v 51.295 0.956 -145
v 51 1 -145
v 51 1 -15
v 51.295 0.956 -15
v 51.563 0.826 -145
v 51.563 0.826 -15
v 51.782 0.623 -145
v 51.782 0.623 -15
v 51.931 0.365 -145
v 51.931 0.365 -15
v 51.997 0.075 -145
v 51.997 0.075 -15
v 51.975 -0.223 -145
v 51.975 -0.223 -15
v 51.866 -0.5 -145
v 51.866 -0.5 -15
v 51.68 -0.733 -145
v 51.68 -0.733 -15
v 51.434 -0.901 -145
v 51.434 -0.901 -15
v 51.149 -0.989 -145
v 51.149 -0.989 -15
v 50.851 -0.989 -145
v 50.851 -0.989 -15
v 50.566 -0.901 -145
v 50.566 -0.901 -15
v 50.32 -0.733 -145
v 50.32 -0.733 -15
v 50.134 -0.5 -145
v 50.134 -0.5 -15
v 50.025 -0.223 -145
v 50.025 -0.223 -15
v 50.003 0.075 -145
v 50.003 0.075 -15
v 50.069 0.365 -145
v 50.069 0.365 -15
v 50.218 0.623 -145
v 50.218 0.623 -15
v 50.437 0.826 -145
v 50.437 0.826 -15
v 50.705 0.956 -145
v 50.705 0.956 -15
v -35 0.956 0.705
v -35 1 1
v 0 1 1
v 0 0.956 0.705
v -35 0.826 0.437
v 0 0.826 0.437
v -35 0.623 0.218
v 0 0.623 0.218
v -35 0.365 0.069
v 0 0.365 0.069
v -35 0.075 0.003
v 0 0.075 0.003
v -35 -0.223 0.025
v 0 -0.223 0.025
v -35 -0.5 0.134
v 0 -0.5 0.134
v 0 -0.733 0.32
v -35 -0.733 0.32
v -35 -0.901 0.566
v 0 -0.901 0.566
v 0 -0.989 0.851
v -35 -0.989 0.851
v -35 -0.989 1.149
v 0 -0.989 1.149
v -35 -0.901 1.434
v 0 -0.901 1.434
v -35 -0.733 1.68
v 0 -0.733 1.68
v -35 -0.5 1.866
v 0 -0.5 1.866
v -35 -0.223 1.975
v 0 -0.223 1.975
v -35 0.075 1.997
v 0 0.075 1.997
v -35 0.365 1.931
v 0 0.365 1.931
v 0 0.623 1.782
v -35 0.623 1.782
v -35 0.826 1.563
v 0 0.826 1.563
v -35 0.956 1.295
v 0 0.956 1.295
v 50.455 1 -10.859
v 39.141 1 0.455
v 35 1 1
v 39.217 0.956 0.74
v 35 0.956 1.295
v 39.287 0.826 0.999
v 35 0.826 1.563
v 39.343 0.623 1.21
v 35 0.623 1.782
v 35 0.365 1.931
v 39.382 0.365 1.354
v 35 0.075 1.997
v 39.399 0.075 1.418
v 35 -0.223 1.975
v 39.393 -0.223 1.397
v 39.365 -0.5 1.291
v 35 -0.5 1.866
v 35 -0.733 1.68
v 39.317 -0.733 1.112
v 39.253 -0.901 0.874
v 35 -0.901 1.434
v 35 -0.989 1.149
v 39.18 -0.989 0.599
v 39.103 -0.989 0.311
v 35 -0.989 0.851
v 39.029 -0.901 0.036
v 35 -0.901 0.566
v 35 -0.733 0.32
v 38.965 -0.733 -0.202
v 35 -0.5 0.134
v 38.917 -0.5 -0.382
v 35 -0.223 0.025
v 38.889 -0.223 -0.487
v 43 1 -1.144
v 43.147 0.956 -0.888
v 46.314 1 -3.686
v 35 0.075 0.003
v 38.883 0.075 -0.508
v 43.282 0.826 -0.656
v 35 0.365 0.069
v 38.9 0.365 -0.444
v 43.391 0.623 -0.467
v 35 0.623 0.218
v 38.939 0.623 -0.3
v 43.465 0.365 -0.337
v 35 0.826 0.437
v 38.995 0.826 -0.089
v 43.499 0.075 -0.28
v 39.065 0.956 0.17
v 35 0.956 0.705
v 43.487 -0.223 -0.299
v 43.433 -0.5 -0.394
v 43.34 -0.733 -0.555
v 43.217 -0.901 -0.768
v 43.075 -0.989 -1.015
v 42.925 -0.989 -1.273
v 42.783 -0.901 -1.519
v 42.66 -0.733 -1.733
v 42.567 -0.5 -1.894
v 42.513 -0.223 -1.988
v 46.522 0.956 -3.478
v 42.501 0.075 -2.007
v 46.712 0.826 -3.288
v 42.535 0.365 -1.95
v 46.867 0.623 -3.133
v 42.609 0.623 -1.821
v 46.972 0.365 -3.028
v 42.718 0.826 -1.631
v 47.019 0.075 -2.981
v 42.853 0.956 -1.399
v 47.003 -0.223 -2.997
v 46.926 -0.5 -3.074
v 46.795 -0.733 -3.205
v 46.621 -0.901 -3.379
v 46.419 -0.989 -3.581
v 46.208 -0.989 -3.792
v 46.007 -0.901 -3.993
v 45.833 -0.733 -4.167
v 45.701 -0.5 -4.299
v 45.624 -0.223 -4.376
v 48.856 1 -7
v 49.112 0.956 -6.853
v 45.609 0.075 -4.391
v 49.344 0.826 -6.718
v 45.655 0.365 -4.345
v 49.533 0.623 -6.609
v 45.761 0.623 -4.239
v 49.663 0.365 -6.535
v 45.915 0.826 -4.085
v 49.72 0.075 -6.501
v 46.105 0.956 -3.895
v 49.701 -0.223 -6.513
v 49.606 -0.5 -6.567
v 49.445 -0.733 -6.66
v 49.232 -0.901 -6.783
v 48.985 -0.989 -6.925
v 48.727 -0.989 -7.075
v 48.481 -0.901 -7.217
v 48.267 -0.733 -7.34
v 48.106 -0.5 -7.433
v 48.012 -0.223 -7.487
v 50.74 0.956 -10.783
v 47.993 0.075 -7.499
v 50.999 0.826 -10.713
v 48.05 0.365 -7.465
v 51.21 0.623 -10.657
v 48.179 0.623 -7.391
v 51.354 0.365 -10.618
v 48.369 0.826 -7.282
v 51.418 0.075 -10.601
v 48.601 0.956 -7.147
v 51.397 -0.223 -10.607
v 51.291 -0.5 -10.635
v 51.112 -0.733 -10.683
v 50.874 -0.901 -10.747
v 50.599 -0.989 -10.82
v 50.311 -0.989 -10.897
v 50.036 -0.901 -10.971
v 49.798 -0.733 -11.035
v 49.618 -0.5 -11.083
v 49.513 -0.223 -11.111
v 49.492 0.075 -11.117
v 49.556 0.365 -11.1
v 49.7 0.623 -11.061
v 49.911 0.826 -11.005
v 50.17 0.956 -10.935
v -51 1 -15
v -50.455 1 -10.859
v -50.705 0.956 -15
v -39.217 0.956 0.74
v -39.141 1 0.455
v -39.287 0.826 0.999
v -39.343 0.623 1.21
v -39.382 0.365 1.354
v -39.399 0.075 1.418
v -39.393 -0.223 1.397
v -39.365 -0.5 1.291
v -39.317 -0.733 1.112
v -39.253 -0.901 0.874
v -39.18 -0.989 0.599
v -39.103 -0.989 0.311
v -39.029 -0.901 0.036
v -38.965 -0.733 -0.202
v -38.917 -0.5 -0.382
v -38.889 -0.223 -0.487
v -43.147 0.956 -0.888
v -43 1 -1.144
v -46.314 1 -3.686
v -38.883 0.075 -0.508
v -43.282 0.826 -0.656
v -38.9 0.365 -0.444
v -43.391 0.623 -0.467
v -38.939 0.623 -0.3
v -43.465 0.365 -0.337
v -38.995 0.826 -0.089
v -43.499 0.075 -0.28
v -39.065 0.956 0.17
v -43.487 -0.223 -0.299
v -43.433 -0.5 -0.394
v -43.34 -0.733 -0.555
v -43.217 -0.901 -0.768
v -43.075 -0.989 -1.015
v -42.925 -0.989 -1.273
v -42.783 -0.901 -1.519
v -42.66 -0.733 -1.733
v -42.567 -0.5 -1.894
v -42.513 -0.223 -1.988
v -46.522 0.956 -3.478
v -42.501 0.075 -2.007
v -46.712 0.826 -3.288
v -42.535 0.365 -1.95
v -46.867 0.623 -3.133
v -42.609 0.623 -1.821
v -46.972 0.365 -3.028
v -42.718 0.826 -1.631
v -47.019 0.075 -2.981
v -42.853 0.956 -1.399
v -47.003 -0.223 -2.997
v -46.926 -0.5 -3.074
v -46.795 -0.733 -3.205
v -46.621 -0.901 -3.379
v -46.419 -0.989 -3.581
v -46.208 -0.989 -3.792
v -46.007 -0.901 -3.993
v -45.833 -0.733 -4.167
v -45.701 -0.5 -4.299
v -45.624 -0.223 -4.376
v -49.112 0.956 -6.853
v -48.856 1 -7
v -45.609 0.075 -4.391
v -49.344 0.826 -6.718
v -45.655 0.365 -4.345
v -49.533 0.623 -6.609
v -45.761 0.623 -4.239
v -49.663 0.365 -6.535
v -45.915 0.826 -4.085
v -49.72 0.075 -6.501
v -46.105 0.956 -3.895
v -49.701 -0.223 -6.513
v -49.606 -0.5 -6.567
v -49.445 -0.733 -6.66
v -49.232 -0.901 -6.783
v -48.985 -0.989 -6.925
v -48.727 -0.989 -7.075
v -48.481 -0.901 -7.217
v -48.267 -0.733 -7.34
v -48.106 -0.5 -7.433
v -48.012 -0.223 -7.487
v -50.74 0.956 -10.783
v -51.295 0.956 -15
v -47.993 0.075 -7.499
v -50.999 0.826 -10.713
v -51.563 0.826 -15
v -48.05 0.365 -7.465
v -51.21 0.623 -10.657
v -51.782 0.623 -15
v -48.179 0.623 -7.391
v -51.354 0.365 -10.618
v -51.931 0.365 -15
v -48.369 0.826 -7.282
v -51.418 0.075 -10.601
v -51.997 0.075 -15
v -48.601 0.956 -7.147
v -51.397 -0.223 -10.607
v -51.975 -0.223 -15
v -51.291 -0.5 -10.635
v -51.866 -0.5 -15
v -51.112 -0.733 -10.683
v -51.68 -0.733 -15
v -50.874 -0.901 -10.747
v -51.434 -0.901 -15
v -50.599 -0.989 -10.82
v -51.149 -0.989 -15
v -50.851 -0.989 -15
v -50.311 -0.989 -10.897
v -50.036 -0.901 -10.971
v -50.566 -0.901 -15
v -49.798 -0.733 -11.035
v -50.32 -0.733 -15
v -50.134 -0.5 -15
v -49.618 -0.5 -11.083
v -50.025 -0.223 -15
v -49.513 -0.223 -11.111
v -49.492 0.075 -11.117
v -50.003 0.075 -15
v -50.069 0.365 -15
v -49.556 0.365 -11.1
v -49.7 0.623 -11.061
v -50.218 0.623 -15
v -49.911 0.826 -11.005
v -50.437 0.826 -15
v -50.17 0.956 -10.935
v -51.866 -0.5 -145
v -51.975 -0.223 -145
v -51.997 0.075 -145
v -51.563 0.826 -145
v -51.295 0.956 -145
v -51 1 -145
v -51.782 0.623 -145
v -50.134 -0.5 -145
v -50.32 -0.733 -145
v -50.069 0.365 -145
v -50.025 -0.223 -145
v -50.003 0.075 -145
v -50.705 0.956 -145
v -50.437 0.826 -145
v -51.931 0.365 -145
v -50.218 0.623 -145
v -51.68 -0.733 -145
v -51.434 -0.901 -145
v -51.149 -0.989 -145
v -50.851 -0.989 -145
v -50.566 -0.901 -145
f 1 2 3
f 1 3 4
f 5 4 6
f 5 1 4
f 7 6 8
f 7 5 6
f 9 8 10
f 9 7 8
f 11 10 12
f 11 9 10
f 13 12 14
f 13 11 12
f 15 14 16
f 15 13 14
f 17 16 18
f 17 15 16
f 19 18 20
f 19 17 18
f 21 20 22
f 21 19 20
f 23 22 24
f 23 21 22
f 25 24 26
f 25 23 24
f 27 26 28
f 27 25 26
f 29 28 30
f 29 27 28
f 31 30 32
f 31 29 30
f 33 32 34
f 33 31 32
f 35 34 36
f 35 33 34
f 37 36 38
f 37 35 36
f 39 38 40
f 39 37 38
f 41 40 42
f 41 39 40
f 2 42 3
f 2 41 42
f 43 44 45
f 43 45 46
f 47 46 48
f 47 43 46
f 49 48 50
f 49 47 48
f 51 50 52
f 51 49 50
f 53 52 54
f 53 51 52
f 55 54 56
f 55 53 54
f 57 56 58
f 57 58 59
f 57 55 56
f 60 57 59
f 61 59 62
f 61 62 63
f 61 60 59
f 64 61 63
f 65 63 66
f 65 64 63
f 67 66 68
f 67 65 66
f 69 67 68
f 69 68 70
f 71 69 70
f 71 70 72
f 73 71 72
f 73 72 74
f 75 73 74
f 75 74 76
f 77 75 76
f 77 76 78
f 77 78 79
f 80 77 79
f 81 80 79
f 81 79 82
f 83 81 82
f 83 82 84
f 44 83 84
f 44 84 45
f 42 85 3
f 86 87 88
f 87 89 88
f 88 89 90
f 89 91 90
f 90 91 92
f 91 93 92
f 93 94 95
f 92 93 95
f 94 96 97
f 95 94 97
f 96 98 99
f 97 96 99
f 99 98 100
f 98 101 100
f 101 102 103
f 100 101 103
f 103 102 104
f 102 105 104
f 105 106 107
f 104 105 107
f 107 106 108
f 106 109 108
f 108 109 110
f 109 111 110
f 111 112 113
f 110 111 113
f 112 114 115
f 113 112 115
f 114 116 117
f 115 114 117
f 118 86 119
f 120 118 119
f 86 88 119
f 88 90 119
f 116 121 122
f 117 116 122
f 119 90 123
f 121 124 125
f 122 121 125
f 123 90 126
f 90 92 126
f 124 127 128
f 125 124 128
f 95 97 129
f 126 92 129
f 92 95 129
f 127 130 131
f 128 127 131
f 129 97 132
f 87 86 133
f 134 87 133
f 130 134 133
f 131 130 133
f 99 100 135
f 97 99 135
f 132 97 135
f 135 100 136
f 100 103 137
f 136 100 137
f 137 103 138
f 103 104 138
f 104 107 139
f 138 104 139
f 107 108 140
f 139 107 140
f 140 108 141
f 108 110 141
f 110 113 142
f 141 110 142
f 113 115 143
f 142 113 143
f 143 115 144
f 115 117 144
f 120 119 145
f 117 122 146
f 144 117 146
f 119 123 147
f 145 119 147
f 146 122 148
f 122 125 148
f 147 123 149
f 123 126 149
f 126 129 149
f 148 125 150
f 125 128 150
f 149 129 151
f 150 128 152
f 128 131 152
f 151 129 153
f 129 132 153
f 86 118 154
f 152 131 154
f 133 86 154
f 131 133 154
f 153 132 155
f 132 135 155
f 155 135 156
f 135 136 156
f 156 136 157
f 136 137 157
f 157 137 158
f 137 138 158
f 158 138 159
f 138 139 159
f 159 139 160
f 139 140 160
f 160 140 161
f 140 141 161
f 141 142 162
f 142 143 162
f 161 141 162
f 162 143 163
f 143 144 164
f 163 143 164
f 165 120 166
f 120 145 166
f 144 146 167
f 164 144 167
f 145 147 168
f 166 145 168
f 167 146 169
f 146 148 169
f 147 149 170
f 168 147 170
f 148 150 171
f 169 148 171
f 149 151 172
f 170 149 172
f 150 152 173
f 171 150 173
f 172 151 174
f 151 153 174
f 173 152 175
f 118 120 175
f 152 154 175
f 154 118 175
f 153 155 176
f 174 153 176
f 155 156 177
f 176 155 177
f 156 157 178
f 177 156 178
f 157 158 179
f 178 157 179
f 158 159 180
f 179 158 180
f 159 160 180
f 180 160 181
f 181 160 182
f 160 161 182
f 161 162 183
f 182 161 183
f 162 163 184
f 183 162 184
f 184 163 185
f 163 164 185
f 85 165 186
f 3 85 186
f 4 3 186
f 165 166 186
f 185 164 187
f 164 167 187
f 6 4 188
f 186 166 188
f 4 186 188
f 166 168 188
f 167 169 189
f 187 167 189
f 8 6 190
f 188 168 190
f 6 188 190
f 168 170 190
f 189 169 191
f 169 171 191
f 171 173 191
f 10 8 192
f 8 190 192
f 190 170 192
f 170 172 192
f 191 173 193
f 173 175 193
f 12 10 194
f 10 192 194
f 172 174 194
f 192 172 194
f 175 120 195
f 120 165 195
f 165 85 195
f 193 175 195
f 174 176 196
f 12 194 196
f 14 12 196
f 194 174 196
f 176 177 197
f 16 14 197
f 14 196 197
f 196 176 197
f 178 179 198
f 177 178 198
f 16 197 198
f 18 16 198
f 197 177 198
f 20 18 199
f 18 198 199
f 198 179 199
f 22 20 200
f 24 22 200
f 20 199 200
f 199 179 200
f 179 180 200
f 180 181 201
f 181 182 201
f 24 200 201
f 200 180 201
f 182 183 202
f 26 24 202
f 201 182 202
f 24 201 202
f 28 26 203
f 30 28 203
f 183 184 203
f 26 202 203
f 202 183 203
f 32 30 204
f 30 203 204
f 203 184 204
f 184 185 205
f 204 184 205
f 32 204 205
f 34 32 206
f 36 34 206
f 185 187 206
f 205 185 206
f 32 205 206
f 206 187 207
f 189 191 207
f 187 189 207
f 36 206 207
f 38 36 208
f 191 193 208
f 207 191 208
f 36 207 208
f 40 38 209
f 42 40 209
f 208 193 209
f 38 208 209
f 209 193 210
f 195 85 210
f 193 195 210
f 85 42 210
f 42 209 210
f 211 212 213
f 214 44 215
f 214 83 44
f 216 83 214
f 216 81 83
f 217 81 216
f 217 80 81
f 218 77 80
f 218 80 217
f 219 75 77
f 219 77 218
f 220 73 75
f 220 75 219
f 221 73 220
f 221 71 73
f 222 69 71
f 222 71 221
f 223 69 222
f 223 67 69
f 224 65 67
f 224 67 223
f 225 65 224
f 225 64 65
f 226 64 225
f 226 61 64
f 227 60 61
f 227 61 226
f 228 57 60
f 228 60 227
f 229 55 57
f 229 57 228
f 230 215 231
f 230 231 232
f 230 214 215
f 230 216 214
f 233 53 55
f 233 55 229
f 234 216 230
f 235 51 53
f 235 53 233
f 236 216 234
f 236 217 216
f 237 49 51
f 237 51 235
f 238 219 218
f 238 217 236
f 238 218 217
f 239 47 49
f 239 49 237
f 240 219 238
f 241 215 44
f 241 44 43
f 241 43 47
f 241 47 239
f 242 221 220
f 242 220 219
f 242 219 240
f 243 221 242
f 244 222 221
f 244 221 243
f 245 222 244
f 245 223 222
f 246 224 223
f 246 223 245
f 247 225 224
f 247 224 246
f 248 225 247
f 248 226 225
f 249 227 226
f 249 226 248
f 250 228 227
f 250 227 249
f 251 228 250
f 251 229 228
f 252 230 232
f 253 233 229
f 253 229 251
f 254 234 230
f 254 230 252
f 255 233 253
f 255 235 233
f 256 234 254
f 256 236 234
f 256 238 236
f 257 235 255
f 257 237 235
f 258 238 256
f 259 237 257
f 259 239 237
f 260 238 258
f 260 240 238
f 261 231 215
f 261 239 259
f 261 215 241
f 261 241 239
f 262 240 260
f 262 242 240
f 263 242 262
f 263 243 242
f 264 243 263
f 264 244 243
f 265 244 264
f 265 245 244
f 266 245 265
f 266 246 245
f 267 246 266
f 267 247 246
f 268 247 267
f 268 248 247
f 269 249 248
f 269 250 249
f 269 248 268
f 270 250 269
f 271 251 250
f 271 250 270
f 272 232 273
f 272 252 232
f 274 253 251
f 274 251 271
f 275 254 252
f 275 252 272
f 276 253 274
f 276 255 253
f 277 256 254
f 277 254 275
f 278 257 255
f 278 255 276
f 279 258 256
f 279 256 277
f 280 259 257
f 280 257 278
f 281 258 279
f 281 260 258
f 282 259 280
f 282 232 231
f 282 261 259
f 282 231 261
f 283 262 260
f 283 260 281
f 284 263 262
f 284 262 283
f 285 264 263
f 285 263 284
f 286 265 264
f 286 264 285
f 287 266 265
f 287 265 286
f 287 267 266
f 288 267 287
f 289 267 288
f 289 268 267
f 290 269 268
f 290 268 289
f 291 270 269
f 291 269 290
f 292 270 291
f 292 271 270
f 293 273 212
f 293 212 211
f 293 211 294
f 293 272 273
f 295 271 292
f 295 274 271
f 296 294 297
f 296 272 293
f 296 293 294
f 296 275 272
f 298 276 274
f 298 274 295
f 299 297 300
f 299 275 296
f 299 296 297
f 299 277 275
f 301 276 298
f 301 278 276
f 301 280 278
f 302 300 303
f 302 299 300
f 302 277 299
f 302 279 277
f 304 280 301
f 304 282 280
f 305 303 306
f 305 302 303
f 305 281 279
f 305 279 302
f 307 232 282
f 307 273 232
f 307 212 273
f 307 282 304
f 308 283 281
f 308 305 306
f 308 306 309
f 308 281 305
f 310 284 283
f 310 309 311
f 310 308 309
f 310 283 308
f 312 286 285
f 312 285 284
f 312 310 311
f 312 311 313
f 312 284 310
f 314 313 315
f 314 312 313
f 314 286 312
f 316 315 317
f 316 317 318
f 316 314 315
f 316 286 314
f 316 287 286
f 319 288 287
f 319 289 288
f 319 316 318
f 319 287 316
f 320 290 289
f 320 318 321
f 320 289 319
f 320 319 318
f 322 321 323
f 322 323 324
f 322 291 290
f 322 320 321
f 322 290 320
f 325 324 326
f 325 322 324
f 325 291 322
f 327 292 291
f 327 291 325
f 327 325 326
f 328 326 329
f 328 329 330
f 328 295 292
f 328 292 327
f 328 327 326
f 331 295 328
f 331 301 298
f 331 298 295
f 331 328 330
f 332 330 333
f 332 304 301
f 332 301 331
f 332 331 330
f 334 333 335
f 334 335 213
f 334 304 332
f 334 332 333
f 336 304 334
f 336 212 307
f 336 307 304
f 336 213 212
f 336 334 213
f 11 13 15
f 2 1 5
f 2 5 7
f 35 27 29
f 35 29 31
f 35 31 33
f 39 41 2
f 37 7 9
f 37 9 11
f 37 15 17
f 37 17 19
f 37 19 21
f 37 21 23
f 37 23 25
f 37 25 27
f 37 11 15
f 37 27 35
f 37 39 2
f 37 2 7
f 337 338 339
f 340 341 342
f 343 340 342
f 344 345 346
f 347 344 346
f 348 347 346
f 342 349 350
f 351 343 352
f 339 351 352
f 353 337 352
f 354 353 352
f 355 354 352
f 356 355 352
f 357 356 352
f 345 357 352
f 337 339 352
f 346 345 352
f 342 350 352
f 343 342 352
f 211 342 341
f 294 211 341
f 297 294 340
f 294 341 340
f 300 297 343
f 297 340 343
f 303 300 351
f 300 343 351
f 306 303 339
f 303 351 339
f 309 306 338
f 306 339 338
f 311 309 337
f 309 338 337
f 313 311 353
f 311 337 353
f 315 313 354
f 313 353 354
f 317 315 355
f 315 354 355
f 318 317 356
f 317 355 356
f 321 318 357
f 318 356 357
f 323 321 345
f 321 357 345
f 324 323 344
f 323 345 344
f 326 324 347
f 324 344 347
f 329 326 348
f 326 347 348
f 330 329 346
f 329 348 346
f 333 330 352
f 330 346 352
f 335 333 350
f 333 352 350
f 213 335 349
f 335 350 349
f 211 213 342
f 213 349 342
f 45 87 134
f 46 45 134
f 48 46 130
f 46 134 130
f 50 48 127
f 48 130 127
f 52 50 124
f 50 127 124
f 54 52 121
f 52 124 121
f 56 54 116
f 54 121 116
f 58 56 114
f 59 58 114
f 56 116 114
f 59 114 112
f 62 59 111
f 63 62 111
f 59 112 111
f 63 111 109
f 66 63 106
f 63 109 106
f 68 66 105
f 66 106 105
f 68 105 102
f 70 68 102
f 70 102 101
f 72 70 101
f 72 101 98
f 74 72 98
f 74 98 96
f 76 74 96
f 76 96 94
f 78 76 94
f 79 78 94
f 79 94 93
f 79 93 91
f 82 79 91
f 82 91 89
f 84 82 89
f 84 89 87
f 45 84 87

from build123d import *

# Parameters (mm, degrees)
F1_R = 1


with BuildPart() as f2:
    # F2: sweep along a path in F0
    with BuildLine(Plane.XZ) as f2_path:
        Line((0, 0), (-35, 0))
        ThreePointArc((-35, 0), (-45.606602, -4.393398), (-50, -15))
        Line((-50, -15), (-50, -145))
    # F1 (on Right) → F2 (sweep)
    with BuildSketch(Plane.YZ):
        with Locations((0, 1)):
            Circle(F1_R)
    sweep(path=f2_path.line)

    # F3: F2 across plane


with BuildPart() as f2_1:
    add(f2.part)
    add(f2.part.mirror(Plane.YZ))


solid = f2_1.part
